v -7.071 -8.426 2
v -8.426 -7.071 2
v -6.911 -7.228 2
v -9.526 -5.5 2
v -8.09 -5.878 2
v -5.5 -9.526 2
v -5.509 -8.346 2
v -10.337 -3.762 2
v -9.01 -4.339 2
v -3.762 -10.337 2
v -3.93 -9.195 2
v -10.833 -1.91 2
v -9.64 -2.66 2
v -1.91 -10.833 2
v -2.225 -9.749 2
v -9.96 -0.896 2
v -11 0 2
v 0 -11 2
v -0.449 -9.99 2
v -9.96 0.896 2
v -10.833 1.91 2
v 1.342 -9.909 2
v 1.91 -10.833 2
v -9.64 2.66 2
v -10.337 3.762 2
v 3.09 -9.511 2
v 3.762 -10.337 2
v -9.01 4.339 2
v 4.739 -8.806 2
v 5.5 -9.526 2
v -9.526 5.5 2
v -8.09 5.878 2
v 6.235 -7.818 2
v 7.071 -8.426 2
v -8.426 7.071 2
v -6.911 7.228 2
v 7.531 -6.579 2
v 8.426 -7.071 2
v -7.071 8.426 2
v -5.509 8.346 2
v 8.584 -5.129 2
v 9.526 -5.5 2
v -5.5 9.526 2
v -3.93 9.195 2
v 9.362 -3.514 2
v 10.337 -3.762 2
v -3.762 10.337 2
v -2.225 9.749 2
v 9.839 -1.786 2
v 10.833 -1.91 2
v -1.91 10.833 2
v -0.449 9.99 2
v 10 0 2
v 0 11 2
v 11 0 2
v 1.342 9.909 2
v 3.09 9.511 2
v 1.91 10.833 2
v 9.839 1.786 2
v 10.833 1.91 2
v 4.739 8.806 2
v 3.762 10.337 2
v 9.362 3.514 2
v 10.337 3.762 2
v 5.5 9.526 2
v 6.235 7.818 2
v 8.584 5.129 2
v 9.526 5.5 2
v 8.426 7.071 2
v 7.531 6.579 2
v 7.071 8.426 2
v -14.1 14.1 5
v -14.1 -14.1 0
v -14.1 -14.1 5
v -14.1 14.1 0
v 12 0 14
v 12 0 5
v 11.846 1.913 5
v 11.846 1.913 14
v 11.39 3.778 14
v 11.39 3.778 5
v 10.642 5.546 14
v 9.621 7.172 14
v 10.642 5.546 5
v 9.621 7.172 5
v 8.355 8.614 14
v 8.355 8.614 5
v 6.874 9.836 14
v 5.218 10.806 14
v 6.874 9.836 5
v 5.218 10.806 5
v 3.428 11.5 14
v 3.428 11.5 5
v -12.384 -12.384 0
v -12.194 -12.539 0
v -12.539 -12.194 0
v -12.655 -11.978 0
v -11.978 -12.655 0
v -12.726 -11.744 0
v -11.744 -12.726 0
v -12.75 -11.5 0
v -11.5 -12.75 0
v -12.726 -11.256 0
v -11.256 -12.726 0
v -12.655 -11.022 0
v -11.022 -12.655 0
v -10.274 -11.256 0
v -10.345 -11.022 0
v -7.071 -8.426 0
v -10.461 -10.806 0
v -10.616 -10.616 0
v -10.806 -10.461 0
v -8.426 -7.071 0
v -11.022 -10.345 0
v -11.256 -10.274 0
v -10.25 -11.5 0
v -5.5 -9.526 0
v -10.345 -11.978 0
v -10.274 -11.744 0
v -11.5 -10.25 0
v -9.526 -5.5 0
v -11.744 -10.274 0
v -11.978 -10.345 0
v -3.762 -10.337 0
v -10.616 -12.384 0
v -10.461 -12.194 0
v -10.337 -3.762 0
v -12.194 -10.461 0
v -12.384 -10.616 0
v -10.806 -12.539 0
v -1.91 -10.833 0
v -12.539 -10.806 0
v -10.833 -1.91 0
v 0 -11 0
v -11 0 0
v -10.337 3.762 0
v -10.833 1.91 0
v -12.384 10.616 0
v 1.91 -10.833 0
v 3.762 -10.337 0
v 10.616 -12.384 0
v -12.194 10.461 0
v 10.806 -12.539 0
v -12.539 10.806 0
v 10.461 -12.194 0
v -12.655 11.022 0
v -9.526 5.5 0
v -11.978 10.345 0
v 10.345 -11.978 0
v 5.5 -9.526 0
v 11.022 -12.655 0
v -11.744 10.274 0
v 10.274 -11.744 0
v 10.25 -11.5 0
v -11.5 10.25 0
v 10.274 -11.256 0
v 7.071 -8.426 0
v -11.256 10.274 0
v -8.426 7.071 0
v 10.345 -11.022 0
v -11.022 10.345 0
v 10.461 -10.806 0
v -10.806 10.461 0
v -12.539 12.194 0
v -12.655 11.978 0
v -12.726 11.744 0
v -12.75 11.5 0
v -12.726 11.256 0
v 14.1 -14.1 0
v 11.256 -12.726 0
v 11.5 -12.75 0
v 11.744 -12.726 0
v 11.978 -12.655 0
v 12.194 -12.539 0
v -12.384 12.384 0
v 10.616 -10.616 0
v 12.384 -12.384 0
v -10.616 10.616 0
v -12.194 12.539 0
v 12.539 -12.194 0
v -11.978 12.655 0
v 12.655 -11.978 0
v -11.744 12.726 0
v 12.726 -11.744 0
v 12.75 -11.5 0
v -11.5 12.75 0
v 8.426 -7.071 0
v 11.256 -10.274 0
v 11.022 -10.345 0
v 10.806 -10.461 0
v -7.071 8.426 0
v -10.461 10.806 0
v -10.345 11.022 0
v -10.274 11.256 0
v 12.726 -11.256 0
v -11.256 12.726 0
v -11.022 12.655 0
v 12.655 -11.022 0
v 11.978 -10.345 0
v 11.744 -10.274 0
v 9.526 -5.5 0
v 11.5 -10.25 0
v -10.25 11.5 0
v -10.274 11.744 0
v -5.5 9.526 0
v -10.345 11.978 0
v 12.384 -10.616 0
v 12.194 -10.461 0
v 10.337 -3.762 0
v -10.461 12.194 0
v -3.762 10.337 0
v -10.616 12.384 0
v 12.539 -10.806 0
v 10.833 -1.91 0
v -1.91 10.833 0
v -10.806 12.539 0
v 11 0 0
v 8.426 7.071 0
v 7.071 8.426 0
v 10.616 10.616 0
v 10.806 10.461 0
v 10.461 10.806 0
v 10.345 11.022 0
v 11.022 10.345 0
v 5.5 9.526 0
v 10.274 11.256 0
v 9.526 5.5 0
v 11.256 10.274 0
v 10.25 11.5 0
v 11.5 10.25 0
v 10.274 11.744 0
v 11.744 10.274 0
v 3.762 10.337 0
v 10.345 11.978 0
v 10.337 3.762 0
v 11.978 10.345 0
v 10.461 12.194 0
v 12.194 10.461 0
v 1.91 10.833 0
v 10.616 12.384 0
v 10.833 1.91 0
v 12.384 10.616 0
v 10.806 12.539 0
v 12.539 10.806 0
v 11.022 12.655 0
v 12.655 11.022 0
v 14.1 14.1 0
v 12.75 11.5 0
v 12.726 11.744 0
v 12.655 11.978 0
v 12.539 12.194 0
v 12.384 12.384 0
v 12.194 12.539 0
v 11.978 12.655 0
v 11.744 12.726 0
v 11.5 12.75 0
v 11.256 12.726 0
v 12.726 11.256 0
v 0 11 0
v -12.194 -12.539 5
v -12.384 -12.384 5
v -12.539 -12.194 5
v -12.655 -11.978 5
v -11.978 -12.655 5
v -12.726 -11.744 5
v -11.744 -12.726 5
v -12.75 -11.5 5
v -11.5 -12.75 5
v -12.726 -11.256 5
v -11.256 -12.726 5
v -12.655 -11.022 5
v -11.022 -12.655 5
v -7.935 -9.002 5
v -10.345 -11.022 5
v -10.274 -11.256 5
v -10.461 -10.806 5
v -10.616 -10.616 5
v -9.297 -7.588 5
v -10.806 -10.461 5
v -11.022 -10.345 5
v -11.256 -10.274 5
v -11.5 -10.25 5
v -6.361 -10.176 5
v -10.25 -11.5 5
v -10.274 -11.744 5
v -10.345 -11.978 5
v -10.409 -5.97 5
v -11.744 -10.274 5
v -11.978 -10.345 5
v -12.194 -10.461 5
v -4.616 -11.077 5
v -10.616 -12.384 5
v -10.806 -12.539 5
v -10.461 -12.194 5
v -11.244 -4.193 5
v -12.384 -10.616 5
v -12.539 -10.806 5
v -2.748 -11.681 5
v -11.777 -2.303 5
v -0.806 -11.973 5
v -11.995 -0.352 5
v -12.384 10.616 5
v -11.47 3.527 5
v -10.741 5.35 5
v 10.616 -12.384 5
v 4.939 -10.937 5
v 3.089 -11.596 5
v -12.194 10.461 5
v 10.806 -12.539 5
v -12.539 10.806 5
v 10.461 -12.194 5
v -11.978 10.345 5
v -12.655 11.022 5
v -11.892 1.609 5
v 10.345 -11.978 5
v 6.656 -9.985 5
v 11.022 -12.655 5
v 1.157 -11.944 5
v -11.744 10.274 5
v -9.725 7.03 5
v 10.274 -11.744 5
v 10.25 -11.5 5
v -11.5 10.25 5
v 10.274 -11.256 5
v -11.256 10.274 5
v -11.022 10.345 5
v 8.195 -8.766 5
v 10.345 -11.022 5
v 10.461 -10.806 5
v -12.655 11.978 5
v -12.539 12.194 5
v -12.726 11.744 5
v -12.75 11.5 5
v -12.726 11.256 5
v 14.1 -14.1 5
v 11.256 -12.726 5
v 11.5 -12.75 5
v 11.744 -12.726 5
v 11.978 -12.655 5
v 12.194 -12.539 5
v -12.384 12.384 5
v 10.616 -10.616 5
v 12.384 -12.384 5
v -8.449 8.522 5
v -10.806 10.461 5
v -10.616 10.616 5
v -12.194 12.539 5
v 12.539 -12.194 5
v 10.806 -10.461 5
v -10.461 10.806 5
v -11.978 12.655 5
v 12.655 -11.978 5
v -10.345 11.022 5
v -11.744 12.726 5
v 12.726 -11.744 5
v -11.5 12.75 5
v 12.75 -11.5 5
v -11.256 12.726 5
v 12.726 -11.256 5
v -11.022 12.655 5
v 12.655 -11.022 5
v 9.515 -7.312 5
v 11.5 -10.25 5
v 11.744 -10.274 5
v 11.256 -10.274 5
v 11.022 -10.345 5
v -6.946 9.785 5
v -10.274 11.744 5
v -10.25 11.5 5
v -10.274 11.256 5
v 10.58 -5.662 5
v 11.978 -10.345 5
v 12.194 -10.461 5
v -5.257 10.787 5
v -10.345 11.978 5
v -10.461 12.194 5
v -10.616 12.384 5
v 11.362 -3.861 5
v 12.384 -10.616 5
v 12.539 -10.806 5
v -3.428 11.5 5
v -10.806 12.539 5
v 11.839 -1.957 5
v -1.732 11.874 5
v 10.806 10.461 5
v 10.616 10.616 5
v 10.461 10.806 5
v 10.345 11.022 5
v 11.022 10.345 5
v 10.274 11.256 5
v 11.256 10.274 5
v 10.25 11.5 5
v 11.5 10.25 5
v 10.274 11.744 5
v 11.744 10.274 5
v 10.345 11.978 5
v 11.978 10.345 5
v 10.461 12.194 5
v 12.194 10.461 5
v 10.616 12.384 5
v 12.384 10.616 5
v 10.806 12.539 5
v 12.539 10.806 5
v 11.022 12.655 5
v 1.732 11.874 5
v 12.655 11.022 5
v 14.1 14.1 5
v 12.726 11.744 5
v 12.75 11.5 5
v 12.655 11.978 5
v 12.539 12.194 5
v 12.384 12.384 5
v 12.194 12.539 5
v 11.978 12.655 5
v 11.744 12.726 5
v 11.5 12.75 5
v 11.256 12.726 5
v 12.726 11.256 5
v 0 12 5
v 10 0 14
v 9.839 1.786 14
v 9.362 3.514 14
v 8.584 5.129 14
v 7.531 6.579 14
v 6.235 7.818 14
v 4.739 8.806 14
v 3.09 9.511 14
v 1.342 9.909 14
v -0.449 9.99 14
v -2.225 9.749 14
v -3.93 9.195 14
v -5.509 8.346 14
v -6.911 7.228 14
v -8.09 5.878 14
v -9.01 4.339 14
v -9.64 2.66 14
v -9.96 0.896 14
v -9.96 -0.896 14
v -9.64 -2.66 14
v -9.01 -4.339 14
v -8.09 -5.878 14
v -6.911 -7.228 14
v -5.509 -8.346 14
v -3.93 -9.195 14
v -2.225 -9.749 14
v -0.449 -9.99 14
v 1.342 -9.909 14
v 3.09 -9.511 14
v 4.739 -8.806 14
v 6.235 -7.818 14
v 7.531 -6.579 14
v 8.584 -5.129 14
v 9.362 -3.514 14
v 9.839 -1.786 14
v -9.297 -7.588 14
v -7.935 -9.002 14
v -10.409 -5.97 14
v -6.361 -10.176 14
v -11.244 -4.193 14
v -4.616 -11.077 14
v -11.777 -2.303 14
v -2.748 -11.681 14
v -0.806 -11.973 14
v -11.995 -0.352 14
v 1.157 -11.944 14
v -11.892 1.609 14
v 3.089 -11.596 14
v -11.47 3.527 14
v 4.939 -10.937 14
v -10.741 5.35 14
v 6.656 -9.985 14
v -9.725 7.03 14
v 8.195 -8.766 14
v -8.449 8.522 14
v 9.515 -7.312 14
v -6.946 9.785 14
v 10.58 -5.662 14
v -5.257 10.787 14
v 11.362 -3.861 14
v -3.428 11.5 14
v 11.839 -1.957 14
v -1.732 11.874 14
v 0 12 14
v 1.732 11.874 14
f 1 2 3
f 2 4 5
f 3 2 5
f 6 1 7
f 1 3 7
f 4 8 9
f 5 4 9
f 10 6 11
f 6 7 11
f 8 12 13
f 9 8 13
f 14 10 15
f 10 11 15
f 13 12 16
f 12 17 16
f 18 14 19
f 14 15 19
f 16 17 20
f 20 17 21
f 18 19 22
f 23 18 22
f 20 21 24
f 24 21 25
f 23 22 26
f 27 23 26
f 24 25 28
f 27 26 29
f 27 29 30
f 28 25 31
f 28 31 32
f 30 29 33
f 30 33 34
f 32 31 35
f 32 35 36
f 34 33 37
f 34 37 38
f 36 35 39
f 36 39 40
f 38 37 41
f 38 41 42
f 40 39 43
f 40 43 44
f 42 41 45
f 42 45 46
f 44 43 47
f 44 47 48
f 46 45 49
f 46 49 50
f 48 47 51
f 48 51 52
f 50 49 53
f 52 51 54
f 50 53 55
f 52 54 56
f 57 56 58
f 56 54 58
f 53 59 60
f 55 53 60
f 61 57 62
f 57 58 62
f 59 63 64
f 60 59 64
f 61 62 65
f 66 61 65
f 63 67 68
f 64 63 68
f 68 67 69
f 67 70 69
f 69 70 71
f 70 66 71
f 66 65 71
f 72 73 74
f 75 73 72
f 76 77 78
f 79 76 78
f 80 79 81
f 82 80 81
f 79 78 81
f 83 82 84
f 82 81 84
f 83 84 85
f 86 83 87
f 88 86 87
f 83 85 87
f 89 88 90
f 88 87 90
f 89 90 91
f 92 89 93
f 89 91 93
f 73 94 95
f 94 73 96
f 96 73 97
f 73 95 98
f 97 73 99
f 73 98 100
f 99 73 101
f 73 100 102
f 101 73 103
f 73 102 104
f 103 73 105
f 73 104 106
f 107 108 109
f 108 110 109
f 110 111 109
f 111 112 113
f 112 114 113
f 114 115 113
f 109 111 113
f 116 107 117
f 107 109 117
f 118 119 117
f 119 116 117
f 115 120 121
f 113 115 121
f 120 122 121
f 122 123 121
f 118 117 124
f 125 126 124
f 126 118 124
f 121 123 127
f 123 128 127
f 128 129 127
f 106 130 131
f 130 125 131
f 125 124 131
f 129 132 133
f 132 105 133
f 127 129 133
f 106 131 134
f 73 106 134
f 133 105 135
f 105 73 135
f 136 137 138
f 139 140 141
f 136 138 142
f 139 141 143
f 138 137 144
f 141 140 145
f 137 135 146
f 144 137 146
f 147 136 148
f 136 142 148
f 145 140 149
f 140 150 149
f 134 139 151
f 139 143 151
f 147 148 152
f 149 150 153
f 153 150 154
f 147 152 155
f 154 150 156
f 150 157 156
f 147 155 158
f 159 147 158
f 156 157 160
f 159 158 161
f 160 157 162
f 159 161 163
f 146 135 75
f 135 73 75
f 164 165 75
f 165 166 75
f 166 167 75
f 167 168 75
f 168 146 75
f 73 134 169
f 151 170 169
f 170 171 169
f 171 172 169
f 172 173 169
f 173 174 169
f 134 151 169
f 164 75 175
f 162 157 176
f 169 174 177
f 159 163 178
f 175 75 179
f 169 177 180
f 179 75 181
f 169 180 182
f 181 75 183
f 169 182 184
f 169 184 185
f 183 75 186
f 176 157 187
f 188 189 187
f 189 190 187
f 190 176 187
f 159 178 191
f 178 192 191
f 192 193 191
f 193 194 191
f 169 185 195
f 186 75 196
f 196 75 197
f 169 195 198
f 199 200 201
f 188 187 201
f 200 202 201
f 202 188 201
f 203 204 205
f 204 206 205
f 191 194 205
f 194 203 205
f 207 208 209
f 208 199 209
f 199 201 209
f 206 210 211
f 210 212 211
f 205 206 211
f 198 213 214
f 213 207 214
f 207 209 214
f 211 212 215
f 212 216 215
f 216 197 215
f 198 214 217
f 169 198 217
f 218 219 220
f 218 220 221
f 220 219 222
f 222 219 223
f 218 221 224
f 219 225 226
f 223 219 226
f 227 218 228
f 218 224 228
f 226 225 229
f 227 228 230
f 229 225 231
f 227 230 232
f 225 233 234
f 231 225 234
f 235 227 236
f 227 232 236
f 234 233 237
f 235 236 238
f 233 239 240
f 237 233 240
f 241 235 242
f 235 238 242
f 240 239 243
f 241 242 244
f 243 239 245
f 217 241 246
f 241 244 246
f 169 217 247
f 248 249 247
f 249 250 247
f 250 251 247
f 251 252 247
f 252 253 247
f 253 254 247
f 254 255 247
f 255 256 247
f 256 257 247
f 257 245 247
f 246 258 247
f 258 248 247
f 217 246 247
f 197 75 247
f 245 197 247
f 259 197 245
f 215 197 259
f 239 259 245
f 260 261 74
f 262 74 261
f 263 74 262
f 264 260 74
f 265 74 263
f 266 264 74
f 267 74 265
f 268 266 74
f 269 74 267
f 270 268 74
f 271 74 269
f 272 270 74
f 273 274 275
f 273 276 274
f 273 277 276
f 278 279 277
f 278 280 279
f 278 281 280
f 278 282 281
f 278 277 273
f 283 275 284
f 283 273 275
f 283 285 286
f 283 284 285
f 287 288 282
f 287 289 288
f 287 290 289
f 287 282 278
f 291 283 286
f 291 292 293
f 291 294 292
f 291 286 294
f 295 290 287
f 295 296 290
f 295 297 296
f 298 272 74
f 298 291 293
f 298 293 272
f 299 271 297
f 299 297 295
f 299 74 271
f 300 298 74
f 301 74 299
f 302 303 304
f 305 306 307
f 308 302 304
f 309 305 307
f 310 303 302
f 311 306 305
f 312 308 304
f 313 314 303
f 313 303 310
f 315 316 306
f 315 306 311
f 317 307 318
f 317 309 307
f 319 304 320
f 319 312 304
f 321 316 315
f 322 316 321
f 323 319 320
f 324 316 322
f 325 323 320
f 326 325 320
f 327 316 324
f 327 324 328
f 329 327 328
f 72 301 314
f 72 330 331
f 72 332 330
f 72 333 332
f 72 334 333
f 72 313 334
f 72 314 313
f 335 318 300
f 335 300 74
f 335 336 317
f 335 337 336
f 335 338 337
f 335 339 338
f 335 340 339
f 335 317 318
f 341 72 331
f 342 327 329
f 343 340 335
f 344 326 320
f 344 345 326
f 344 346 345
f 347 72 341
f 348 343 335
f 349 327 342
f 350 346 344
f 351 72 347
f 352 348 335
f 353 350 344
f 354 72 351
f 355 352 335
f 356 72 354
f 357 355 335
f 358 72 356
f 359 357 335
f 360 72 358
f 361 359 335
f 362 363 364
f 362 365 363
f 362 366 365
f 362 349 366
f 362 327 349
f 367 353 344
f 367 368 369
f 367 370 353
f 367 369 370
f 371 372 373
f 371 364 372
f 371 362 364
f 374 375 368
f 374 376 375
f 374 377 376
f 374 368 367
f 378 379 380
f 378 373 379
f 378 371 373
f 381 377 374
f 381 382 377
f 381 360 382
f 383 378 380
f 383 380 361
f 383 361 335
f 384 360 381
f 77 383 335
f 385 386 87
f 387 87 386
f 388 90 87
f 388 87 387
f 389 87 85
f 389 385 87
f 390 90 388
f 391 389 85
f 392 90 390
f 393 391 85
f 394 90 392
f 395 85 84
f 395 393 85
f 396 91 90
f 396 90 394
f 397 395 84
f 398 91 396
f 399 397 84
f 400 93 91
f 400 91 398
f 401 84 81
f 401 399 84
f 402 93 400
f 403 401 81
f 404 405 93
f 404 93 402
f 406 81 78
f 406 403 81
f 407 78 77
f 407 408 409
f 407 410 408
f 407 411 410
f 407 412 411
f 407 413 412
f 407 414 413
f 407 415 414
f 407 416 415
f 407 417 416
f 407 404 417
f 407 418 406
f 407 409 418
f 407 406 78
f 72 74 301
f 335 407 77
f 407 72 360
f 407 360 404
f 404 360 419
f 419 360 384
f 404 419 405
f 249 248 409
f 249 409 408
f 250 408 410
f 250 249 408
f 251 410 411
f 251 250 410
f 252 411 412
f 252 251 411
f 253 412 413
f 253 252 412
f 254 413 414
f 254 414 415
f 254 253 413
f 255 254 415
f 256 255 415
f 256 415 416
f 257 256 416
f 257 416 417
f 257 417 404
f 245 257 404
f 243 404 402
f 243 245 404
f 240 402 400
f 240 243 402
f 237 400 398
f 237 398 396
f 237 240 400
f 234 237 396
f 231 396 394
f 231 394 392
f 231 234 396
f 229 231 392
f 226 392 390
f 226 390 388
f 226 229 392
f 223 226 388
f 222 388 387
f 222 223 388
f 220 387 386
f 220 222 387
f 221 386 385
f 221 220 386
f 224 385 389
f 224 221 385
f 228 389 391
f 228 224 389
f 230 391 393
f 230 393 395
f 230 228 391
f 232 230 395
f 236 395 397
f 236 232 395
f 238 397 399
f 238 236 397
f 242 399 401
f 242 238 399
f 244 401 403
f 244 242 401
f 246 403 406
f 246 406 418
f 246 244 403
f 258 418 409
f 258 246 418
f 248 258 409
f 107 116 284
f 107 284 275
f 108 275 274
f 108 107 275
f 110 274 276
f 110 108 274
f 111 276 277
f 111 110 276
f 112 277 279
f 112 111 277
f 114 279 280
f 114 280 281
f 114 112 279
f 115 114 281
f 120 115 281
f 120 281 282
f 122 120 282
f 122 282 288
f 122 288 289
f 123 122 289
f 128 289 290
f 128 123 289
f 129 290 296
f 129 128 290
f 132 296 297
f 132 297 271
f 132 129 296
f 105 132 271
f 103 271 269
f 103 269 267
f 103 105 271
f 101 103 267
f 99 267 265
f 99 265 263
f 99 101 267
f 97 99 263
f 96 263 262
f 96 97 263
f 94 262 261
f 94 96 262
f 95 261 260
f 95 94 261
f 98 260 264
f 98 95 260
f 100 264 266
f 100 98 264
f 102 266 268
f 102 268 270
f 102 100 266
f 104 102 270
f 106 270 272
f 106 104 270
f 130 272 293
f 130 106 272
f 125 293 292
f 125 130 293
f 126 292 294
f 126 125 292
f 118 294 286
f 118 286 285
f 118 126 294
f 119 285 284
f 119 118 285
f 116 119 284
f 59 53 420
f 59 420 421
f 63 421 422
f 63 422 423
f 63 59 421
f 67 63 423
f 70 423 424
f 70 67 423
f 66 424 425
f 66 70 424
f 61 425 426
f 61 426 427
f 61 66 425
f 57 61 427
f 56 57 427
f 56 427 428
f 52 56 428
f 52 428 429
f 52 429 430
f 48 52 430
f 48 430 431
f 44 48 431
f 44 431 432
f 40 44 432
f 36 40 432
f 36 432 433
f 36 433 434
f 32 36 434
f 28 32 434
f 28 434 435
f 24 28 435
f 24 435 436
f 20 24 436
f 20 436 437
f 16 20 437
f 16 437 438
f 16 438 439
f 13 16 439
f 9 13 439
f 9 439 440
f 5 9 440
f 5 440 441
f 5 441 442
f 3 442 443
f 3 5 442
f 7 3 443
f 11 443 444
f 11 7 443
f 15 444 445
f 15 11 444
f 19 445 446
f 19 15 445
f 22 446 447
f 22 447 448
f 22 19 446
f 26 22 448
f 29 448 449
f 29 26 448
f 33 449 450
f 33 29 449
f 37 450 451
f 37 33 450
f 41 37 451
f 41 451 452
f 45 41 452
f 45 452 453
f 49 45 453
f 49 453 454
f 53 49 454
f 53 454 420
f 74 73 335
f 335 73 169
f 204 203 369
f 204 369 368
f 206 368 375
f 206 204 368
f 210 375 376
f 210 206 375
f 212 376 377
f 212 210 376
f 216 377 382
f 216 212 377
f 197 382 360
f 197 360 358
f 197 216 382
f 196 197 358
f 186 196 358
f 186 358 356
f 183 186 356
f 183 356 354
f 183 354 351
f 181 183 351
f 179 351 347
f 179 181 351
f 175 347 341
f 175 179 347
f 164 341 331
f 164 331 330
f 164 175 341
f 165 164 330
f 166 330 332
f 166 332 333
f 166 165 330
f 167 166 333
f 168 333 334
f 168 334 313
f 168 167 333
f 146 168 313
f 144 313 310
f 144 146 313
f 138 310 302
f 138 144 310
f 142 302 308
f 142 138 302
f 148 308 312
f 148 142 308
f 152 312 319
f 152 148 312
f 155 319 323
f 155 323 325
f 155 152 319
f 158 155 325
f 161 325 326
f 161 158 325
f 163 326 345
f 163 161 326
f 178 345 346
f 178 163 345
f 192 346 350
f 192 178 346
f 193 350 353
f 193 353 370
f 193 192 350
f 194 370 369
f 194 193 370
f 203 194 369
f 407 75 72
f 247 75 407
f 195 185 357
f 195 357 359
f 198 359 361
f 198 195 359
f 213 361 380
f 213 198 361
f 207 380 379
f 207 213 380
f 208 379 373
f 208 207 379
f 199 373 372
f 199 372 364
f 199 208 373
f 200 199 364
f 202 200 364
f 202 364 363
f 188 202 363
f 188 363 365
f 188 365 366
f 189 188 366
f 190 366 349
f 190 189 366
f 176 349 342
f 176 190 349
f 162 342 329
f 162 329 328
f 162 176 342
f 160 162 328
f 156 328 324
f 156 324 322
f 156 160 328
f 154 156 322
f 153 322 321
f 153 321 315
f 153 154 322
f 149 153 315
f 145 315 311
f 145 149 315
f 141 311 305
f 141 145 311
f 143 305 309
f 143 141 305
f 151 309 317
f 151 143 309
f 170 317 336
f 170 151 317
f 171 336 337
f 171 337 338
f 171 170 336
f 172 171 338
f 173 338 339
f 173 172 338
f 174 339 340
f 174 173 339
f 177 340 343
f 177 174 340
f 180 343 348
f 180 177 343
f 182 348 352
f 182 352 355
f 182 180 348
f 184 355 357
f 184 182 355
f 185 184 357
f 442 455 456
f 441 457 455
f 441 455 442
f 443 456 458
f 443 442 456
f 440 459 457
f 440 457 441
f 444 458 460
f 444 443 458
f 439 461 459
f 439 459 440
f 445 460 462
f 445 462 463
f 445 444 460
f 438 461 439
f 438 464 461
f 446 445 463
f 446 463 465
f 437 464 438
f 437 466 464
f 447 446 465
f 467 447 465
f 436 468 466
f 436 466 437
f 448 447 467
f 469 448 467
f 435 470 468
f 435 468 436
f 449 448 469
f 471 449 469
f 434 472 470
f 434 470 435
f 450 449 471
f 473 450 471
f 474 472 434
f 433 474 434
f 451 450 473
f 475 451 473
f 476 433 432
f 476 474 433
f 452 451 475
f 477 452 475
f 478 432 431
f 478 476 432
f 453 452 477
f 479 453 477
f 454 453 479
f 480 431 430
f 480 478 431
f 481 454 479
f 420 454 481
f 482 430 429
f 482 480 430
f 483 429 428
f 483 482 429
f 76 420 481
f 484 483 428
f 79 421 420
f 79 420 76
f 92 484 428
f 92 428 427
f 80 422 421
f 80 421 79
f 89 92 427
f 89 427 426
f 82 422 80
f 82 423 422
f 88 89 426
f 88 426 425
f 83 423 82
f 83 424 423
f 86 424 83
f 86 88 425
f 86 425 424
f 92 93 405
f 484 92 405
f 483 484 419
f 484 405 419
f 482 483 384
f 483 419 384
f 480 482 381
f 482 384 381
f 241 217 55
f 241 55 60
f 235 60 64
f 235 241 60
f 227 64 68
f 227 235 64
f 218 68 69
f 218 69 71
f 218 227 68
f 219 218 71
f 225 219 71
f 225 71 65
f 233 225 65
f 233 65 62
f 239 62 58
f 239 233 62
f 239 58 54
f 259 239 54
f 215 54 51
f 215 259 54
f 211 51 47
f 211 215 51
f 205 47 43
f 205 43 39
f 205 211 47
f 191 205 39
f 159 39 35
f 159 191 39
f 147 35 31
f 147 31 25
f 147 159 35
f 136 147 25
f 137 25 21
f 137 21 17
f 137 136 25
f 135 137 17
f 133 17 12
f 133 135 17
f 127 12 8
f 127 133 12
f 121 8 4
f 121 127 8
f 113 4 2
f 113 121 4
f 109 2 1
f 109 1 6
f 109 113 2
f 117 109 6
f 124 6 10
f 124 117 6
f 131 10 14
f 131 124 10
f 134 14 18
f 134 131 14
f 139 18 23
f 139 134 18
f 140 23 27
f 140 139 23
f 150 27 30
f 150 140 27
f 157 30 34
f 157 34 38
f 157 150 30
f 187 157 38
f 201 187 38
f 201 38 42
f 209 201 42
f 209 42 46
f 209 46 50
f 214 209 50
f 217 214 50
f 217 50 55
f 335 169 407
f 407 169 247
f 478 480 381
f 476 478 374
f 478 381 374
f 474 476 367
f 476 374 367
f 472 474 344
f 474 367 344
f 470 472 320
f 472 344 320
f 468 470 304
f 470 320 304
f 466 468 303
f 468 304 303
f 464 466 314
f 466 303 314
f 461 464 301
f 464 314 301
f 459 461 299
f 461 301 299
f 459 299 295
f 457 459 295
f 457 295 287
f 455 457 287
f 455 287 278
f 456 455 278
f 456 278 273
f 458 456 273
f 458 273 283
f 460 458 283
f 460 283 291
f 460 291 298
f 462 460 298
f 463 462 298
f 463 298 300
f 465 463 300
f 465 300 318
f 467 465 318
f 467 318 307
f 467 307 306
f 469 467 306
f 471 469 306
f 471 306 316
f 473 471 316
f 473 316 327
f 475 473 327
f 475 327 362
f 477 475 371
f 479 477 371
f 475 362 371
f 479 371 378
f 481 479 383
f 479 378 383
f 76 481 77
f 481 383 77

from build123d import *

# Parameters (mm, degrees)
SKETCH1_W           = 28.2
SKETCH1_H           = 28.2
SKETCH1_R           = 1.25
SKETCH1_R_2         = 10
BOSS_EXTRUDE1_DEPTH = 5
SKETCH1_3_R         = 12
SKETCH1_3_R_2       = 10
BOSS_EXTRUDE2_DEPTH = 14
SKETCH1_4_R         = 11
SKETCH1_4_R_2       = 10
CUT_EXTRUDE1_DEPTH  = 2


with BuildPart() as part:
    # Sketch1 → Boss-Extrude1 (new body)
    with BuildSketch(Plane.XY):
        Rectangle(SKETCH1_W, SKETCH1_H)
        with Locations((-11.5, -11.5)):
            Circle(SKETCH1_R, mode=Mode.SUBTRACT)
        with Locations((11.5, -11.5)):
            Circle(SKETCH1_R, mode=Mode.SUBTRACT)
        with Locations((-11.5, 11.5)):
            Circle(SKETCH1_R, mode=Mode.SUBTRACT)
        with Locations((11.5, 11.5)):
            Circle(SKETCH1_R, mode=Mode.SUBTRACT)
        Circle(SKETCH1_R_2, mode=Mode.SUBTRACT)
    extrude(amount=BOSS_EXTRUDE1_DEPTH)

    # Sketch1<3> → Boss-Extrude2 (add)
    with BuildSketch(Plane.XY):
        Circle(SKETCH1_3_R)
        Circle(SKETCH1_3_R_2, mode=Mode.SUBTRACT)
    extrude(amount=BOSS_EXTRUDE2_DEPTH)

    # Sketch1<4> → Cut-Extrude1 (cut)
    with BuildSketch(Plane.XY):
        Circle(SKETCH1_4_R)
        Circle(SKETCH1_4_R_2, mode=Mode.SUBTRACT)
    extrude(amount=CUT_EXTRUDE1_DEPTH, mode=Mode.SUBTRACT)


solid = part.part
